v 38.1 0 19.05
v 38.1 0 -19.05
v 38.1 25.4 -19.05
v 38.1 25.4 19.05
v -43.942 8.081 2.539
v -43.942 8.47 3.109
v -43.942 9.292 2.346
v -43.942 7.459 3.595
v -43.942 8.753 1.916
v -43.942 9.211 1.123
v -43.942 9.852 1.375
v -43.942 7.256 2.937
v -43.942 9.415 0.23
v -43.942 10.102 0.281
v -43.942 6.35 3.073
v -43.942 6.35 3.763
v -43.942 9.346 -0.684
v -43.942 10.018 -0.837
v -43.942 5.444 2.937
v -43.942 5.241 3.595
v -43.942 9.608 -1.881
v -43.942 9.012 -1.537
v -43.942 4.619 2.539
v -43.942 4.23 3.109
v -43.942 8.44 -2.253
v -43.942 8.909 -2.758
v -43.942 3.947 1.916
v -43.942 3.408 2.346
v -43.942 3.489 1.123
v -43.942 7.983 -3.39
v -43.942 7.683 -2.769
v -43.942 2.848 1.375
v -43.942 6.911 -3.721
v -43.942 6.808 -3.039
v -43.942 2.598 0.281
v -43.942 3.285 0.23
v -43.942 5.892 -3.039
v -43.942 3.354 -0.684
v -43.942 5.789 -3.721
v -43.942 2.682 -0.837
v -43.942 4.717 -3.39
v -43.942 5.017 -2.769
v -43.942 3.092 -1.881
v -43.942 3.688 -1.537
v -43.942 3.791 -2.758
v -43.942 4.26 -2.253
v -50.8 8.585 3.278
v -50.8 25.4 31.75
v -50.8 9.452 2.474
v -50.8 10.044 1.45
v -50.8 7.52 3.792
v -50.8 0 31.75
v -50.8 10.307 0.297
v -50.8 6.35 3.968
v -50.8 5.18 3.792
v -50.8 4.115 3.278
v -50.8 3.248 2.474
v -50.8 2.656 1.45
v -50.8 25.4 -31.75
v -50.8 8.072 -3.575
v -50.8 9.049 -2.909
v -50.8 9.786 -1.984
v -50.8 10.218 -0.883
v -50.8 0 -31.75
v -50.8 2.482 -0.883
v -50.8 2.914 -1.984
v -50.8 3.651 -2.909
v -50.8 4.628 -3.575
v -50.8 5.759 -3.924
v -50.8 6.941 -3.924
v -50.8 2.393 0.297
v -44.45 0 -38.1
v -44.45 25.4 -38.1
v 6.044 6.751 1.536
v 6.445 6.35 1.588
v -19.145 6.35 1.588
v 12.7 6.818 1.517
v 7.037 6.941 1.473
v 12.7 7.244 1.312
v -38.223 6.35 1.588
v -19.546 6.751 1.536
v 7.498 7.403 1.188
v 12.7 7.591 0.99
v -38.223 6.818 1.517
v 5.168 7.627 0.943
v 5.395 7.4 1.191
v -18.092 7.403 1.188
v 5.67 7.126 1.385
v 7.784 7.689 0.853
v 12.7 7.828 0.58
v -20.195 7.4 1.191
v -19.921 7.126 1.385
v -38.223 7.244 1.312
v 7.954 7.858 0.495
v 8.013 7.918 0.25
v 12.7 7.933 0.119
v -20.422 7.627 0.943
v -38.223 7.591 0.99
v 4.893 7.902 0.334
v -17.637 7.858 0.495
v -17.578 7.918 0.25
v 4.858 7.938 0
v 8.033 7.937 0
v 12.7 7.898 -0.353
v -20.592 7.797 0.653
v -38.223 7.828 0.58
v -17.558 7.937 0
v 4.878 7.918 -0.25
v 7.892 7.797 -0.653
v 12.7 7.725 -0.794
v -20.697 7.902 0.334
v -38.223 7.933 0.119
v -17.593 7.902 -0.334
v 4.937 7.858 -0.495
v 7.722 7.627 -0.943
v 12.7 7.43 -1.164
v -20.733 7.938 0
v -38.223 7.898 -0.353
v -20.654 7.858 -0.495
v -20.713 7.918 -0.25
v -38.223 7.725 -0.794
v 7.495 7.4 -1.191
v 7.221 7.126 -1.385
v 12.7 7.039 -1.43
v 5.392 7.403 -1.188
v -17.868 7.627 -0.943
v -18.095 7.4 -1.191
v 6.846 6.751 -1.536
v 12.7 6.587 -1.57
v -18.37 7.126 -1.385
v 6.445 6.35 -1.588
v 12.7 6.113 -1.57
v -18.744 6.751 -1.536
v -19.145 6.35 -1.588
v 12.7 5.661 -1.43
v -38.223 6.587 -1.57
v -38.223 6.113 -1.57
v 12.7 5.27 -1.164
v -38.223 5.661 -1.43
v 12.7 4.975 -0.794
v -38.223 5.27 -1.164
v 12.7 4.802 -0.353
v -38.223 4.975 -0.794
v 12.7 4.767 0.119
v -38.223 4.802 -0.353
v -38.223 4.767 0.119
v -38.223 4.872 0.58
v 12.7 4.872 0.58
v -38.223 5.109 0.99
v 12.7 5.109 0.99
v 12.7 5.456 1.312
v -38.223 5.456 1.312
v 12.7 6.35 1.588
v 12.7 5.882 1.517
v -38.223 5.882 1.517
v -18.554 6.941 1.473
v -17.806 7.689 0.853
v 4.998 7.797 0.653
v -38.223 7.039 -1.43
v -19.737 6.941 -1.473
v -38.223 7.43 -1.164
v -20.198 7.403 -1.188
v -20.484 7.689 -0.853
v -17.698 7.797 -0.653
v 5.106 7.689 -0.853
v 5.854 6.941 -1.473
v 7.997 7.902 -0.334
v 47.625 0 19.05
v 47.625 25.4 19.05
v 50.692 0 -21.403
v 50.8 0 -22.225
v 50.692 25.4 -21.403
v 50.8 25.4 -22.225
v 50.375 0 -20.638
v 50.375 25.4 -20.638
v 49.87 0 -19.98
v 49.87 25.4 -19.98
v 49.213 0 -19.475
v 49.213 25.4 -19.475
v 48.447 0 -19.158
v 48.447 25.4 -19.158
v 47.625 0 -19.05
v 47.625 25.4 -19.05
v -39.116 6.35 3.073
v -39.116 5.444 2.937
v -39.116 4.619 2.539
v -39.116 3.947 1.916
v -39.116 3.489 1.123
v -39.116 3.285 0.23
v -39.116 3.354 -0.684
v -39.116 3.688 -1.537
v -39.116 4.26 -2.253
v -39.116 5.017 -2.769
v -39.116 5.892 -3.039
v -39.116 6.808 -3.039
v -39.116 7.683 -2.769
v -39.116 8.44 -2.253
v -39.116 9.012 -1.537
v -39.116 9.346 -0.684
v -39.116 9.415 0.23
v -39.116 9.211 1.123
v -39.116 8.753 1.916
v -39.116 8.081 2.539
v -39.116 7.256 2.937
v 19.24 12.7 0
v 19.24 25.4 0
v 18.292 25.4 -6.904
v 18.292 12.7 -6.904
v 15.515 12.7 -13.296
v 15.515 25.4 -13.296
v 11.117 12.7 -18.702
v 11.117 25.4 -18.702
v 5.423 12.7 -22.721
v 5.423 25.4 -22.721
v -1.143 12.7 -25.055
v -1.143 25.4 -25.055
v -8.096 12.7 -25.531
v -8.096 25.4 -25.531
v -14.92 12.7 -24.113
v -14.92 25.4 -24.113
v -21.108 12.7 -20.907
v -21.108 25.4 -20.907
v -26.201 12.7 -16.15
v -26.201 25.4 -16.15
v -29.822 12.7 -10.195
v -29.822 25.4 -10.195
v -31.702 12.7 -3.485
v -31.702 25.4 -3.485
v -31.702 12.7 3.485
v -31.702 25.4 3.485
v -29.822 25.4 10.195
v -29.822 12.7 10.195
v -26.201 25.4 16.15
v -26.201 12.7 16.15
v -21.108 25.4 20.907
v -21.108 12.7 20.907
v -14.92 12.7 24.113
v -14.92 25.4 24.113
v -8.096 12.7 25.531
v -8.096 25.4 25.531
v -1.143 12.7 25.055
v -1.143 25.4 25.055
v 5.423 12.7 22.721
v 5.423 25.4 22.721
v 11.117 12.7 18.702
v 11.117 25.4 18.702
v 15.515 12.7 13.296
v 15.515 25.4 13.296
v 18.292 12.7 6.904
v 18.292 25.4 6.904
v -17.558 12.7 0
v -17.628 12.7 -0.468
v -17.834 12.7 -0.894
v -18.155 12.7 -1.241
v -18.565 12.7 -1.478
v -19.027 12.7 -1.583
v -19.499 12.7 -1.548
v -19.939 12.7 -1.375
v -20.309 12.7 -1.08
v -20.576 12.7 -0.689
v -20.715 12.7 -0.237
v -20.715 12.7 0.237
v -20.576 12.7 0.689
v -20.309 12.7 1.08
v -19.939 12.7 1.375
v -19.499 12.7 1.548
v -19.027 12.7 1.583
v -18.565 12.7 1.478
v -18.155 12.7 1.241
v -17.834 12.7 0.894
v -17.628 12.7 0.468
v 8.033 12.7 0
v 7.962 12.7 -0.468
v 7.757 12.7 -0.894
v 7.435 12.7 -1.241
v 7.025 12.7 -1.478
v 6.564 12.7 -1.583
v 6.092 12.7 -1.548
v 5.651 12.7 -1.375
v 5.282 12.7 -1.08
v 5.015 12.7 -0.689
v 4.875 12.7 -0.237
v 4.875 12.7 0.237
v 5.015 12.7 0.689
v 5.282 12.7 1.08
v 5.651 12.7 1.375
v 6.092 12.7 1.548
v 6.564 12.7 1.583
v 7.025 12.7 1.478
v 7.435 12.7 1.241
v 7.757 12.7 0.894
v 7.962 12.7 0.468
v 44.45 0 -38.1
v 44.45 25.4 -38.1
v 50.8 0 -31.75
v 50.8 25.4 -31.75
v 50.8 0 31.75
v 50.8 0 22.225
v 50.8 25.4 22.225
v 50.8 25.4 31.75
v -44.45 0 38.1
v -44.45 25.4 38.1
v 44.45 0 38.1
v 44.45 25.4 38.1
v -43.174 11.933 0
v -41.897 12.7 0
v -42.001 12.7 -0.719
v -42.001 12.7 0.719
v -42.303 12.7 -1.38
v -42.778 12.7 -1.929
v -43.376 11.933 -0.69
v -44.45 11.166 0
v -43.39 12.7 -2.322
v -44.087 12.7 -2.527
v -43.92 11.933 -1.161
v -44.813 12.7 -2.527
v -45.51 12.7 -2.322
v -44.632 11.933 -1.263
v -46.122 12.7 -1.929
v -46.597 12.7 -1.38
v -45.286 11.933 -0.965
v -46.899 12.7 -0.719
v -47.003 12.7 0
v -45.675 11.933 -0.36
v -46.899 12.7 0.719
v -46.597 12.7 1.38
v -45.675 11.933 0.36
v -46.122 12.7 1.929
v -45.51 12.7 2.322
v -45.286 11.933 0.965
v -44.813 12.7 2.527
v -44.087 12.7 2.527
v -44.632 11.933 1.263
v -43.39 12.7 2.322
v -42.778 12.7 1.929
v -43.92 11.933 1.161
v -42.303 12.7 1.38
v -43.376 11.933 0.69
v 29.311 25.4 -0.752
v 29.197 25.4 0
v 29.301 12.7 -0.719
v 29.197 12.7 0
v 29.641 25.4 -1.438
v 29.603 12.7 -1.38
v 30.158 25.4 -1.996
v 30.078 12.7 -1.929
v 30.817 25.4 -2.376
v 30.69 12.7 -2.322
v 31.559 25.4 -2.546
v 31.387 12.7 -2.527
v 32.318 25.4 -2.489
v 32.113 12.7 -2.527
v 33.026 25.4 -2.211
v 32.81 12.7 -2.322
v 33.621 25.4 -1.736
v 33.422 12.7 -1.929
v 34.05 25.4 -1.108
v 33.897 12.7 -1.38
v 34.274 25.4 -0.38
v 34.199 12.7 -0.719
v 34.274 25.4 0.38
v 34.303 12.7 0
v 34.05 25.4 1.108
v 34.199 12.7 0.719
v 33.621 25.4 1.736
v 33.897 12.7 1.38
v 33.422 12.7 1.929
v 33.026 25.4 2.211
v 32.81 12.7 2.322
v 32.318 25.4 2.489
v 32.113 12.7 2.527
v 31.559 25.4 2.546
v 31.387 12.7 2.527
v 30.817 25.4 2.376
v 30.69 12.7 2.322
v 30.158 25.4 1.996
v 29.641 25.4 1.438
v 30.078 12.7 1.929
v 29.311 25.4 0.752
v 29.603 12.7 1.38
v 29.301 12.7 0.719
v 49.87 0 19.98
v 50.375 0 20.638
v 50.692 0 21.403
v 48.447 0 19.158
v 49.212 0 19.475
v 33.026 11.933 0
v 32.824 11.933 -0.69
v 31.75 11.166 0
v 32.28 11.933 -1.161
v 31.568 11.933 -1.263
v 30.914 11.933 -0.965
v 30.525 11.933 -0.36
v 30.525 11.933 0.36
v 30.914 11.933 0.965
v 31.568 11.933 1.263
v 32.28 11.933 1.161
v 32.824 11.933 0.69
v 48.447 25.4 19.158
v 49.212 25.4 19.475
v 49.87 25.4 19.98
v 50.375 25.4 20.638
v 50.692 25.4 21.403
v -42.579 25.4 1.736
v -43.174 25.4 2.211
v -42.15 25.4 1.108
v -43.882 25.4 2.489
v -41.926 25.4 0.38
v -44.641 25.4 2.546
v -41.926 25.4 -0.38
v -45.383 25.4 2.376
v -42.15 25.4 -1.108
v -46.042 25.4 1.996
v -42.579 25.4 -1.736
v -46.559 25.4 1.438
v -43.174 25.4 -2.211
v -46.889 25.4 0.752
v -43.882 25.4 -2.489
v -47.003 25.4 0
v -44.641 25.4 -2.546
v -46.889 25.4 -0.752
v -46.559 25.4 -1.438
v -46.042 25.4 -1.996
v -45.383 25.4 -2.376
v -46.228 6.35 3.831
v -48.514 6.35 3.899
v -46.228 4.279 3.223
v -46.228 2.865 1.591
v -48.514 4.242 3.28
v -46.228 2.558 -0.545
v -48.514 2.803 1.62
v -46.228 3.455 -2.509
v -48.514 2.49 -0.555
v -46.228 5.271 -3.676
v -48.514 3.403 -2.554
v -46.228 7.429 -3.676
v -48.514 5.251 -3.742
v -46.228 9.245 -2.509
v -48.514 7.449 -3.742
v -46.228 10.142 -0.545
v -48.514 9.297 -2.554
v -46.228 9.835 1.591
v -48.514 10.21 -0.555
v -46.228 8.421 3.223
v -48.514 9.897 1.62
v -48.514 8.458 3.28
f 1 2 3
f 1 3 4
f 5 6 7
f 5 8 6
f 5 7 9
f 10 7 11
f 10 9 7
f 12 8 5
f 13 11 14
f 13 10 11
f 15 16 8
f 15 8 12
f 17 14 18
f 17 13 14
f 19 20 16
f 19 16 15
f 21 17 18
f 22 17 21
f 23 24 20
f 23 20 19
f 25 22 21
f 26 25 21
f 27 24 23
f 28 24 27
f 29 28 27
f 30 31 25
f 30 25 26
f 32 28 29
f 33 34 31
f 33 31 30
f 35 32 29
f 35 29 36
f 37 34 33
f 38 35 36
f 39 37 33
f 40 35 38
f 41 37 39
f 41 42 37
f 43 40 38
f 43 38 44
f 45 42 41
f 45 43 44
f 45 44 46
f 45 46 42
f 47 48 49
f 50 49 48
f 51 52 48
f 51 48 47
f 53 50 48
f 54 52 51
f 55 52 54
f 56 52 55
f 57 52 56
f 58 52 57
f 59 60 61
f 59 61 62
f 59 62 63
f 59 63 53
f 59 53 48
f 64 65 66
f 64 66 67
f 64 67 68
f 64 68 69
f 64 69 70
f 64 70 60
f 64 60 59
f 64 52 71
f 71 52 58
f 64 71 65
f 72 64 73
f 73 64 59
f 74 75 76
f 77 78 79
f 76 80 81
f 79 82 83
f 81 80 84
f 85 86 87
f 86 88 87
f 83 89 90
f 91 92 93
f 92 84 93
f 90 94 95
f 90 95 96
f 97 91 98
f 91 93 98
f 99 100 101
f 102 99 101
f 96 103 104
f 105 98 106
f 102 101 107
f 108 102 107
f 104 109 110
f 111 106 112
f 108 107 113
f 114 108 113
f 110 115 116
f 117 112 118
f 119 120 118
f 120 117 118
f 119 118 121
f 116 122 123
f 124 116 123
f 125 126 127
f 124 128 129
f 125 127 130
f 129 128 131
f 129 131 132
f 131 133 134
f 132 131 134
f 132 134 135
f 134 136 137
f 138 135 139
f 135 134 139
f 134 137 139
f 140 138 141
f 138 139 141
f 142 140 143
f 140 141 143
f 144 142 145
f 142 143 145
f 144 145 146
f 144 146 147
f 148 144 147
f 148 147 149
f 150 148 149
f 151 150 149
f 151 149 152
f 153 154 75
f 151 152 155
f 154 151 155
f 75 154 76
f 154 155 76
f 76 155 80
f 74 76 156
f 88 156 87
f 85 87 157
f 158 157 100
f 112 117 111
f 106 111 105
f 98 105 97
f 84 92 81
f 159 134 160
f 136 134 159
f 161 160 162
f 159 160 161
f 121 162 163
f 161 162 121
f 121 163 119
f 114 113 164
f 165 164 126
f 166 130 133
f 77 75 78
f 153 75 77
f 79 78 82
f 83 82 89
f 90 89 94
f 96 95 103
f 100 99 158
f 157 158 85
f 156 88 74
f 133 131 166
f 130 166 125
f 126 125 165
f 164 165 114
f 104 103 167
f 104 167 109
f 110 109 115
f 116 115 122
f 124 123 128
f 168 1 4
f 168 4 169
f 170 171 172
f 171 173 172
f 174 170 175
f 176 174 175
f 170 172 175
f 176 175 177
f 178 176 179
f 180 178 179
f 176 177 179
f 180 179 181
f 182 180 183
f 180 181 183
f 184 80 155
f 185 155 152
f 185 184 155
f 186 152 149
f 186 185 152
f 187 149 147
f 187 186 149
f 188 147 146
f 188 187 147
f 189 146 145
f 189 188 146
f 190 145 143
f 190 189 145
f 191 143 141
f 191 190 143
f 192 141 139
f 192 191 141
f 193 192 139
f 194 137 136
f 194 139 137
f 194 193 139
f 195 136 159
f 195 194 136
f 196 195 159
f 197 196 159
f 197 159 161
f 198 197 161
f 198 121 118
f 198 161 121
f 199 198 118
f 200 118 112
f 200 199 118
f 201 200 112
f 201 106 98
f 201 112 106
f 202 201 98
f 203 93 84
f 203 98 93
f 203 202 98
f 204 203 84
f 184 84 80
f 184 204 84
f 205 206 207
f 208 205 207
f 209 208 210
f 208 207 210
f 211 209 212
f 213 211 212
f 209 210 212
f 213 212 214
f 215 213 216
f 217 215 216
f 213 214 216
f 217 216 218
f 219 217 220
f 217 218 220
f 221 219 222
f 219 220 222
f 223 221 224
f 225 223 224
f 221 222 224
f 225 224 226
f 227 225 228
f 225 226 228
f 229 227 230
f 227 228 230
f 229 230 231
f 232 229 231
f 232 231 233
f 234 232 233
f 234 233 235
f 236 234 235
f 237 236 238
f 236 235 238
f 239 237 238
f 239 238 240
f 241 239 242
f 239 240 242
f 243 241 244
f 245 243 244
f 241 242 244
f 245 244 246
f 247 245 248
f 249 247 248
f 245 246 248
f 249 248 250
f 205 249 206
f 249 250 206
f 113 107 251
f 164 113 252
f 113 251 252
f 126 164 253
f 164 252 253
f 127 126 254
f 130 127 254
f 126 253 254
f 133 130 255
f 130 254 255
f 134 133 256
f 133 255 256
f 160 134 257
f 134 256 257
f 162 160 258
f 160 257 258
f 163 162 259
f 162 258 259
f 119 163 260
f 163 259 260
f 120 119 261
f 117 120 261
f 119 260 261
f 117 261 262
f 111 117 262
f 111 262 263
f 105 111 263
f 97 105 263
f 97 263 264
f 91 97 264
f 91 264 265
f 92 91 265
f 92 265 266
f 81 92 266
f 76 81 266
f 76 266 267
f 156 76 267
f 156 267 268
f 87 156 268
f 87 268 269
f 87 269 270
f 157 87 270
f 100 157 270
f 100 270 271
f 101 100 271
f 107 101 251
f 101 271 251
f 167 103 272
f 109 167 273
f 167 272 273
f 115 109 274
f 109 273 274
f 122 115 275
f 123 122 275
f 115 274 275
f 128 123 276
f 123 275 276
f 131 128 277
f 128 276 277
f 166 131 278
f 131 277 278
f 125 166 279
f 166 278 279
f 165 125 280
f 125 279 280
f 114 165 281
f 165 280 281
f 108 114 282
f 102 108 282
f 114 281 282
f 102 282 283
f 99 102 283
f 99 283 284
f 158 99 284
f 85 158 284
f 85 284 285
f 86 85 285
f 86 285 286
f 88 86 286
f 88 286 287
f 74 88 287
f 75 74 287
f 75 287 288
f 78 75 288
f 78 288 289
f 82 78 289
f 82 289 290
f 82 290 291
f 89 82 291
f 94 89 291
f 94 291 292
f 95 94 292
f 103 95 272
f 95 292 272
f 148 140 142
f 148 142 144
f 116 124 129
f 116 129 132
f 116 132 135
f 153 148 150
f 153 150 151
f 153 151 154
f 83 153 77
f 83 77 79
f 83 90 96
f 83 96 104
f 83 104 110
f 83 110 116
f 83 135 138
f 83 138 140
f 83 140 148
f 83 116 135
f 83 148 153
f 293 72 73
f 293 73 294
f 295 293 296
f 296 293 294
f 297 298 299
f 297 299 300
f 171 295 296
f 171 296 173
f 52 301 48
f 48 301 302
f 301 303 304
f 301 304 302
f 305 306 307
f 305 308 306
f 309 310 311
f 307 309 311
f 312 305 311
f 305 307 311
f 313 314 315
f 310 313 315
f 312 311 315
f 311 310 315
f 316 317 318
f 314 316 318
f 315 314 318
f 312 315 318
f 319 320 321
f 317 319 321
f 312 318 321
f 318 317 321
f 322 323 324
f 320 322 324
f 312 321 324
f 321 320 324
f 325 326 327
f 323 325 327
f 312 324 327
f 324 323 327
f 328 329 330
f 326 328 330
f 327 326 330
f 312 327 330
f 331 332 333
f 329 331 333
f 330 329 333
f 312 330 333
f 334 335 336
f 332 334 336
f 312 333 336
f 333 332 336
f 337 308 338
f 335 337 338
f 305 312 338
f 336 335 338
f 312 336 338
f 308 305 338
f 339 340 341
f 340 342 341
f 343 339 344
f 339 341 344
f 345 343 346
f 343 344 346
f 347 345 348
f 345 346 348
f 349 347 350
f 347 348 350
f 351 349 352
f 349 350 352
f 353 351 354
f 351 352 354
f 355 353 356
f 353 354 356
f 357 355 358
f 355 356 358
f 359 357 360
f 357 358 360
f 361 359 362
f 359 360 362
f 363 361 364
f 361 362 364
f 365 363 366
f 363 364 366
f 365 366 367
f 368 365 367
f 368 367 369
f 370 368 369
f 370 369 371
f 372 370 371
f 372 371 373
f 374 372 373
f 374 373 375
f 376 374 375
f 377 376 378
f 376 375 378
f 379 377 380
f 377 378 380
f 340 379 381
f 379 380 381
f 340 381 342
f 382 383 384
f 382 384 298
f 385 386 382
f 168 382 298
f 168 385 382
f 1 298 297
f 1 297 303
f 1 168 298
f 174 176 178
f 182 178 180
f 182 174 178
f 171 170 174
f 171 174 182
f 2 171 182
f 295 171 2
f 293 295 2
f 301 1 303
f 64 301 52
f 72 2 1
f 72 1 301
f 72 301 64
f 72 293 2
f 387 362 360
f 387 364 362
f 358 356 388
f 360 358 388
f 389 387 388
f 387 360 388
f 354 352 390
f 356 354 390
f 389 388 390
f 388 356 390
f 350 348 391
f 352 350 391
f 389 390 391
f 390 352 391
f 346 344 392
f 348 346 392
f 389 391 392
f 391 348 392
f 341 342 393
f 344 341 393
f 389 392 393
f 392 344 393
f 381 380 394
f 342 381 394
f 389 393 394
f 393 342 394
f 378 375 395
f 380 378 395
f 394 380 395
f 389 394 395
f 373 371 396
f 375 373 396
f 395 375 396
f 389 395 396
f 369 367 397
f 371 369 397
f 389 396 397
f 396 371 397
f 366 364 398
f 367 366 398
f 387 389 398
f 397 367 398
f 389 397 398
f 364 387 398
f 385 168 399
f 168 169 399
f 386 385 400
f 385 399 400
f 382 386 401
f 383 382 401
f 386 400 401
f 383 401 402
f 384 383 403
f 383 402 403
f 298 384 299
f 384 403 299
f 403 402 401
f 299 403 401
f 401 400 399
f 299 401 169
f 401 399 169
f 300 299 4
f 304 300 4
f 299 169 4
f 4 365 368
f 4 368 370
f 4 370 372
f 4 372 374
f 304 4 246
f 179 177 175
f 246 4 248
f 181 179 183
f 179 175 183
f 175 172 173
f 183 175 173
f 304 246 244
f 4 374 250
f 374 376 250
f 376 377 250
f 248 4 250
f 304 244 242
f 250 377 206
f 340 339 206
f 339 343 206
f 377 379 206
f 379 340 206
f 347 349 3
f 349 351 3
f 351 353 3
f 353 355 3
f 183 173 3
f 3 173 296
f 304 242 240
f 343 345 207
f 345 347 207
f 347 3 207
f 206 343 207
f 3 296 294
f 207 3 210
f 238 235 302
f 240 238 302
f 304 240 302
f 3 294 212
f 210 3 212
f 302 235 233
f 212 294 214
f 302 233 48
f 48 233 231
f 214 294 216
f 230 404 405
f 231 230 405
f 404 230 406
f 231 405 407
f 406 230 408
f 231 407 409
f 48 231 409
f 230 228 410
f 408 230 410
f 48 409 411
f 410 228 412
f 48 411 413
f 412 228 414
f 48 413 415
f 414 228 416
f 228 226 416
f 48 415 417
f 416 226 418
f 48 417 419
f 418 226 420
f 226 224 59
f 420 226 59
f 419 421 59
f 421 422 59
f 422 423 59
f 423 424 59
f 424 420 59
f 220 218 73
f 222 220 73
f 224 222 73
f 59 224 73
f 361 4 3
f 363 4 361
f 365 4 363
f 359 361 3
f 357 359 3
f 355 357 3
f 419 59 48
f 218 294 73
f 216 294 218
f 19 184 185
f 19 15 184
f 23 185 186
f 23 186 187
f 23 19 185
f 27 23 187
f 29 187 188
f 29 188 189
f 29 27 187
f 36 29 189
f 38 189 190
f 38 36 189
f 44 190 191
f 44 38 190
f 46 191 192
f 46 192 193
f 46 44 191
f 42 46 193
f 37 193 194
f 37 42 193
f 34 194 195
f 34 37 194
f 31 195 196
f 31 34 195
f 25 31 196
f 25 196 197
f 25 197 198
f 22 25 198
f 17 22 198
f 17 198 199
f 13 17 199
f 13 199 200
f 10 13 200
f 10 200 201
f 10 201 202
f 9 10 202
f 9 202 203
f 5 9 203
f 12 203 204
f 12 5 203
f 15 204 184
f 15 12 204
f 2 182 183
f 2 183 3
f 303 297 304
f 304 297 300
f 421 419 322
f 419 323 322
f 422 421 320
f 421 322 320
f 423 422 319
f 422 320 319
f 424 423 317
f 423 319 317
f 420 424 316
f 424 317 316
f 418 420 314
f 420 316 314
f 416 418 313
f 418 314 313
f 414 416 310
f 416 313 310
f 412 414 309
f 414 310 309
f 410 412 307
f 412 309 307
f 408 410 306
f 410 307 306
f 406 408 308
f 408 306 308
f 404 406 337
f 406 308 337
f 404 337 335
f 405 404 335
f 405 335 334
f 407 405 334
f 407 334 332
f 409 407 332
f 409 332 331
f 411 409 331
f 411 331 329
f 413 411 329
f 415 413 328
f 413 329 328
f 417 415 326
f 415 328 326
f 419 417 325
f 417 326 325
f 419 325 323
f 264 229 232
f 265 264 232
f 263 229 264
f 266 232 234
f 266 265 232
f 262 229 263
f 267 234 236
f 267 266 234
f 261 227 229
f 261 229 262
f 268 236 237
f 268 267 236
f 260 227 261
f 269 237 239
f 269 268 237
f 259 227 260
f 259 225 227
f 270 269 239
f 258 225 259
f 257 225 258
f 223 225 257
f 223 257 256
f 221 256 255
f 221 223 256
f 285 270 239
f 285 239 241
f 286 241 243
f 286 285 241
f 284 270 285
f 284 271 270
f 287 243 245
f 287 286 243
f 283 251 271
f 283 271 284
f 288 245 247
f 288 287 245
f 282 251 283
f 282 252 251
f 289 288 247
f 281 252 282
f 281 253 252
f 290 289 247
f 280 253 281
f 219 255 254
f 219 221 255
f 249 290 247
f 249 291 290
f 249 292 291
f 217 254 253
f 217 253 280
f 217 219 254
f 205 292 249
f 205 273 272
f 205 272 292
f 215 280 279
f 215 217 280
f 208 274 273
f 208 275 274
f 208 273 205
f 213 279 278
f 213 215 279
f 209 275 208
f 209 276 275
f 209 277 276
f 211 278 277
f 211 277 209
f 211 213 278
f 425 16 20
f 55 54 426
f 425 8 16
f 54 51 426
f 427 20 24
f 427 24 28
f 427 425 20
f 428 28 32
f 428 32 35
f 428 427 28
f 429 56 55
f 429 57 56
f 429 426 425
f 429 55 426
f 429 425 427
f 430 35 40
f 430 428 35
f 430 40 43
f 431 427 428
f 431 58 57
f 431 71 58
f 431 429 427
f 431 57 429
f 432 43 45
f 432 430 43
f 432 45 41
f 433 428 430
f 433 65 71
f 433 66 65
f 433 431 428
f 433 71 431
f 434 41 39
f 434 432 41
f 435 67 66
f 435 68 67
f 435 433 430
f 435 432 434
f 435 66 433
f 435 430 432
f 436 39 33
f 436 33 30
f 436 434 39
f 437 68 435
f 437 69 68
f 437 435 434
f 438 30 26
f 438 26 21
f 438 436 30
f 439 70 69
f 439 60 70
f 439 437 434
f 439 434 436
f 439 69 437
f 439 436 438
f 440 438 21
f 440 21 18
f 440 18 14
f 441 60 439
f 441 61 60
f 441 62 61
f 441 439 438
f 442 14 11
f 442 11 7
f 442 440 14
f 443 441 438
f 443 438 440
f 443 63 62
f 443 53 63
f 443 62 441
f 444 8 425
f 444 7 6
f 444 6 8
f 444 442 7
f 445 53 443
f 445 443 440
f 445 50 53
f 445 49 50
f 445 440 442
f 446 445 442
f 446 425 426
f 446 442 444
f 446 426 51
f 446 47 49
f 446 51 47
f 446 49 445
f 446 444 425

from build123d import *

# Parameters (mm, degrees)
BOX_BODY_DEPTH                 = 25.4
SKETCH3_R                      = 25.5905
SAMPLE_HOLE_DEPTH              = 12.7
CUTOUT_EDGE_FILLET_R           = 3.175
BOX_EDGE_CHAMFER_SIZE          = 6.35
BOX_CLAMP_THREADED_HOLES_D     = 5.1054
BOX_CLAMP_THREADED_HOLES_DEPTH = 12.7
BOX_CLAMP_THREADED_HOLES_TIP   = 1.533816902
SKETCH10_R                     = 1.5875
CUT_EXTRUDE2_DEPTH             = 63.5
CUT_EXTRUDE3_REACH             = 14.7
FLUID_HOLES_R                  = 1.5875


with BuildPart() as part:
    # Sketch1 → box body (new body)
    with BuildSketch(Plane(origin=(0, 0, 0), x_dir=(1, 0, 0), z_dir=(0, 1, 0))):
        Polygon((-50.8, 38.1), (50.8, 38.1), (50.8, 19.05), (38.1, 19.05), (38.1, -19.05), (50.8, -19.05), (50.8, -38.1), (-50.8, -38.1), align=None)
    extrude(amount=BOX_BODY_DEPTH)

    # Sketch3 → sample hole (cut)
    with BuildSketch(Plane(origin=(0, 25.4, 0), x_dir=(1, 0, 0), z_dir=(0, 1, 0))):
        with Locations((-6.35, 0)):
            Circle(SKETCH3_R)
    extrude(amount=-SAMPLE_HOLE_DEPTH, mode=Mode.SUBTRACT)

    # cutout edge fillet
    cutout_edge_fillet_edges = [part.edges().sort_by_distance(p)[0] for p in [
        (50.8, 12.7, -19.05),
        (50.8, 12.7, 19.05),
    ]]
    fillet(cutout_edge_fillet_edges, radius=CUTOUT_EDGE_FILLET_R)

    # box edge chamfer
    box_edge_chamfer_edges = [part.edges().sort_by_distance(p)[0] for p in [
        (50.8, 12.7, 38.1),
        (-50.8, 12.7, 38.1),
        (-50.8, 12.7, -38.1),
        (50.8, 12.7, -38.1),
    ]]
    chamfer(box_edge_chamfer_edges, length=BOX_EDGE_CHAMFER_SIZE)

    # box clamp threaded holes
    with Locations(Plane(origin=(0, 25.4, 0), x_dir=(1, 0, 0), z_dir=(0, 1, 0))):
        with Locations((-44.45, 0), (31.75, 0)):
            Hole(BOX_CLAMP_THREADED_HOLES_D / 2, depth=BOX_CLAMP_THREADED_HOLES_DEPTH)
            with Locations((0, 0, -(BOX_CLAMP_THREADED_HOLES_DEPTH + BOX_CLAMP_THREADED_HOLES_TIP / 2))):  # 118° drill point
                Cone(0, BOX_CLAMP_THREADED_HOLES_D / 2, BOX_CLAMP_THREADED_HOLES_TIP, mode=Mode.SUBTRACT)

    # Sketch10 → Cut-Extrude2 (cut)
    with BuildSketch(Plane.ZY.offset(50.8)):
        with Locations((0, 6.35)):
            Circle(SKETCH10_R)
    extrude(amount=-CUT_EXTRUDE2_DEPTH, mode=Mode.SUBTRACT)

    # fluid holes → Cut-Extrude3 (cut, up to next)
    with BuildSketch(Plane(origin=(0, 12.7, 0), x_dir=(1, 0, 0), z_dir=(0, 1, 0)), mode=Mode.PRIVATE) as cut_extrude3_sk1:
        with Locations((-19.14525, 0)):
            Circle(FLUID_HOLES_R)
    cut_extrude3_tool1 = extrude(cut_extrude3_sk1.sketch, amount=-CUT_EXTRUDE3_REACH, mode=Mode.PRIVATE) & part.part
    add(cut_extrude3_tool1.solids().sort_by_distance((-19.14525, 12.7, 0))[0], mode=Mode.SUBTRACT)
    # fluid holes → Cut-Extrude3 (cut, up to next)
    with BuildSketch(Plane(origin=(0, 12.7, 0), x_dir=(1, 0, 0), z_dir=(0, 1, 0)), mode=Mode.PRIVATE) as cut_extrude3_sk2:
        with Locations((6.44525, 0)):
            Circle(FLUID_HOLES_R)
    cut_extrude3_tool2 = extrude(cut_extrude3_sk2.sketch, amount=-CUT_EXTRUDE3_REACH, mode=Mode.PRIVATE) & part.part
    add(cut_extrude3_tool2.solids().sort_by_distance((6.44525, 12.7, 0))[0], mode=Mode.SUBTRACT)

    # Sketch15 → 1/16 NPT Tapped Hole2 (revolve, cut)
    with BuildSketch(Plane(origin=(-50.8, 6.35, 0), x_dir=(0, 0, 1), z_dir=(0, 1, 0))):
        Polygon((0, 0), (0, 13.530685027), (3.0734, 11.684), (3.0734, 6.858), (3.762574096, 6.858), (3.9679118, 0), align=None)
    revolve(axis=Axis((-57.15, 6.35, 0), (1, 0, 0)), mode=Mode.SUBTRACT)


solid = part.part
